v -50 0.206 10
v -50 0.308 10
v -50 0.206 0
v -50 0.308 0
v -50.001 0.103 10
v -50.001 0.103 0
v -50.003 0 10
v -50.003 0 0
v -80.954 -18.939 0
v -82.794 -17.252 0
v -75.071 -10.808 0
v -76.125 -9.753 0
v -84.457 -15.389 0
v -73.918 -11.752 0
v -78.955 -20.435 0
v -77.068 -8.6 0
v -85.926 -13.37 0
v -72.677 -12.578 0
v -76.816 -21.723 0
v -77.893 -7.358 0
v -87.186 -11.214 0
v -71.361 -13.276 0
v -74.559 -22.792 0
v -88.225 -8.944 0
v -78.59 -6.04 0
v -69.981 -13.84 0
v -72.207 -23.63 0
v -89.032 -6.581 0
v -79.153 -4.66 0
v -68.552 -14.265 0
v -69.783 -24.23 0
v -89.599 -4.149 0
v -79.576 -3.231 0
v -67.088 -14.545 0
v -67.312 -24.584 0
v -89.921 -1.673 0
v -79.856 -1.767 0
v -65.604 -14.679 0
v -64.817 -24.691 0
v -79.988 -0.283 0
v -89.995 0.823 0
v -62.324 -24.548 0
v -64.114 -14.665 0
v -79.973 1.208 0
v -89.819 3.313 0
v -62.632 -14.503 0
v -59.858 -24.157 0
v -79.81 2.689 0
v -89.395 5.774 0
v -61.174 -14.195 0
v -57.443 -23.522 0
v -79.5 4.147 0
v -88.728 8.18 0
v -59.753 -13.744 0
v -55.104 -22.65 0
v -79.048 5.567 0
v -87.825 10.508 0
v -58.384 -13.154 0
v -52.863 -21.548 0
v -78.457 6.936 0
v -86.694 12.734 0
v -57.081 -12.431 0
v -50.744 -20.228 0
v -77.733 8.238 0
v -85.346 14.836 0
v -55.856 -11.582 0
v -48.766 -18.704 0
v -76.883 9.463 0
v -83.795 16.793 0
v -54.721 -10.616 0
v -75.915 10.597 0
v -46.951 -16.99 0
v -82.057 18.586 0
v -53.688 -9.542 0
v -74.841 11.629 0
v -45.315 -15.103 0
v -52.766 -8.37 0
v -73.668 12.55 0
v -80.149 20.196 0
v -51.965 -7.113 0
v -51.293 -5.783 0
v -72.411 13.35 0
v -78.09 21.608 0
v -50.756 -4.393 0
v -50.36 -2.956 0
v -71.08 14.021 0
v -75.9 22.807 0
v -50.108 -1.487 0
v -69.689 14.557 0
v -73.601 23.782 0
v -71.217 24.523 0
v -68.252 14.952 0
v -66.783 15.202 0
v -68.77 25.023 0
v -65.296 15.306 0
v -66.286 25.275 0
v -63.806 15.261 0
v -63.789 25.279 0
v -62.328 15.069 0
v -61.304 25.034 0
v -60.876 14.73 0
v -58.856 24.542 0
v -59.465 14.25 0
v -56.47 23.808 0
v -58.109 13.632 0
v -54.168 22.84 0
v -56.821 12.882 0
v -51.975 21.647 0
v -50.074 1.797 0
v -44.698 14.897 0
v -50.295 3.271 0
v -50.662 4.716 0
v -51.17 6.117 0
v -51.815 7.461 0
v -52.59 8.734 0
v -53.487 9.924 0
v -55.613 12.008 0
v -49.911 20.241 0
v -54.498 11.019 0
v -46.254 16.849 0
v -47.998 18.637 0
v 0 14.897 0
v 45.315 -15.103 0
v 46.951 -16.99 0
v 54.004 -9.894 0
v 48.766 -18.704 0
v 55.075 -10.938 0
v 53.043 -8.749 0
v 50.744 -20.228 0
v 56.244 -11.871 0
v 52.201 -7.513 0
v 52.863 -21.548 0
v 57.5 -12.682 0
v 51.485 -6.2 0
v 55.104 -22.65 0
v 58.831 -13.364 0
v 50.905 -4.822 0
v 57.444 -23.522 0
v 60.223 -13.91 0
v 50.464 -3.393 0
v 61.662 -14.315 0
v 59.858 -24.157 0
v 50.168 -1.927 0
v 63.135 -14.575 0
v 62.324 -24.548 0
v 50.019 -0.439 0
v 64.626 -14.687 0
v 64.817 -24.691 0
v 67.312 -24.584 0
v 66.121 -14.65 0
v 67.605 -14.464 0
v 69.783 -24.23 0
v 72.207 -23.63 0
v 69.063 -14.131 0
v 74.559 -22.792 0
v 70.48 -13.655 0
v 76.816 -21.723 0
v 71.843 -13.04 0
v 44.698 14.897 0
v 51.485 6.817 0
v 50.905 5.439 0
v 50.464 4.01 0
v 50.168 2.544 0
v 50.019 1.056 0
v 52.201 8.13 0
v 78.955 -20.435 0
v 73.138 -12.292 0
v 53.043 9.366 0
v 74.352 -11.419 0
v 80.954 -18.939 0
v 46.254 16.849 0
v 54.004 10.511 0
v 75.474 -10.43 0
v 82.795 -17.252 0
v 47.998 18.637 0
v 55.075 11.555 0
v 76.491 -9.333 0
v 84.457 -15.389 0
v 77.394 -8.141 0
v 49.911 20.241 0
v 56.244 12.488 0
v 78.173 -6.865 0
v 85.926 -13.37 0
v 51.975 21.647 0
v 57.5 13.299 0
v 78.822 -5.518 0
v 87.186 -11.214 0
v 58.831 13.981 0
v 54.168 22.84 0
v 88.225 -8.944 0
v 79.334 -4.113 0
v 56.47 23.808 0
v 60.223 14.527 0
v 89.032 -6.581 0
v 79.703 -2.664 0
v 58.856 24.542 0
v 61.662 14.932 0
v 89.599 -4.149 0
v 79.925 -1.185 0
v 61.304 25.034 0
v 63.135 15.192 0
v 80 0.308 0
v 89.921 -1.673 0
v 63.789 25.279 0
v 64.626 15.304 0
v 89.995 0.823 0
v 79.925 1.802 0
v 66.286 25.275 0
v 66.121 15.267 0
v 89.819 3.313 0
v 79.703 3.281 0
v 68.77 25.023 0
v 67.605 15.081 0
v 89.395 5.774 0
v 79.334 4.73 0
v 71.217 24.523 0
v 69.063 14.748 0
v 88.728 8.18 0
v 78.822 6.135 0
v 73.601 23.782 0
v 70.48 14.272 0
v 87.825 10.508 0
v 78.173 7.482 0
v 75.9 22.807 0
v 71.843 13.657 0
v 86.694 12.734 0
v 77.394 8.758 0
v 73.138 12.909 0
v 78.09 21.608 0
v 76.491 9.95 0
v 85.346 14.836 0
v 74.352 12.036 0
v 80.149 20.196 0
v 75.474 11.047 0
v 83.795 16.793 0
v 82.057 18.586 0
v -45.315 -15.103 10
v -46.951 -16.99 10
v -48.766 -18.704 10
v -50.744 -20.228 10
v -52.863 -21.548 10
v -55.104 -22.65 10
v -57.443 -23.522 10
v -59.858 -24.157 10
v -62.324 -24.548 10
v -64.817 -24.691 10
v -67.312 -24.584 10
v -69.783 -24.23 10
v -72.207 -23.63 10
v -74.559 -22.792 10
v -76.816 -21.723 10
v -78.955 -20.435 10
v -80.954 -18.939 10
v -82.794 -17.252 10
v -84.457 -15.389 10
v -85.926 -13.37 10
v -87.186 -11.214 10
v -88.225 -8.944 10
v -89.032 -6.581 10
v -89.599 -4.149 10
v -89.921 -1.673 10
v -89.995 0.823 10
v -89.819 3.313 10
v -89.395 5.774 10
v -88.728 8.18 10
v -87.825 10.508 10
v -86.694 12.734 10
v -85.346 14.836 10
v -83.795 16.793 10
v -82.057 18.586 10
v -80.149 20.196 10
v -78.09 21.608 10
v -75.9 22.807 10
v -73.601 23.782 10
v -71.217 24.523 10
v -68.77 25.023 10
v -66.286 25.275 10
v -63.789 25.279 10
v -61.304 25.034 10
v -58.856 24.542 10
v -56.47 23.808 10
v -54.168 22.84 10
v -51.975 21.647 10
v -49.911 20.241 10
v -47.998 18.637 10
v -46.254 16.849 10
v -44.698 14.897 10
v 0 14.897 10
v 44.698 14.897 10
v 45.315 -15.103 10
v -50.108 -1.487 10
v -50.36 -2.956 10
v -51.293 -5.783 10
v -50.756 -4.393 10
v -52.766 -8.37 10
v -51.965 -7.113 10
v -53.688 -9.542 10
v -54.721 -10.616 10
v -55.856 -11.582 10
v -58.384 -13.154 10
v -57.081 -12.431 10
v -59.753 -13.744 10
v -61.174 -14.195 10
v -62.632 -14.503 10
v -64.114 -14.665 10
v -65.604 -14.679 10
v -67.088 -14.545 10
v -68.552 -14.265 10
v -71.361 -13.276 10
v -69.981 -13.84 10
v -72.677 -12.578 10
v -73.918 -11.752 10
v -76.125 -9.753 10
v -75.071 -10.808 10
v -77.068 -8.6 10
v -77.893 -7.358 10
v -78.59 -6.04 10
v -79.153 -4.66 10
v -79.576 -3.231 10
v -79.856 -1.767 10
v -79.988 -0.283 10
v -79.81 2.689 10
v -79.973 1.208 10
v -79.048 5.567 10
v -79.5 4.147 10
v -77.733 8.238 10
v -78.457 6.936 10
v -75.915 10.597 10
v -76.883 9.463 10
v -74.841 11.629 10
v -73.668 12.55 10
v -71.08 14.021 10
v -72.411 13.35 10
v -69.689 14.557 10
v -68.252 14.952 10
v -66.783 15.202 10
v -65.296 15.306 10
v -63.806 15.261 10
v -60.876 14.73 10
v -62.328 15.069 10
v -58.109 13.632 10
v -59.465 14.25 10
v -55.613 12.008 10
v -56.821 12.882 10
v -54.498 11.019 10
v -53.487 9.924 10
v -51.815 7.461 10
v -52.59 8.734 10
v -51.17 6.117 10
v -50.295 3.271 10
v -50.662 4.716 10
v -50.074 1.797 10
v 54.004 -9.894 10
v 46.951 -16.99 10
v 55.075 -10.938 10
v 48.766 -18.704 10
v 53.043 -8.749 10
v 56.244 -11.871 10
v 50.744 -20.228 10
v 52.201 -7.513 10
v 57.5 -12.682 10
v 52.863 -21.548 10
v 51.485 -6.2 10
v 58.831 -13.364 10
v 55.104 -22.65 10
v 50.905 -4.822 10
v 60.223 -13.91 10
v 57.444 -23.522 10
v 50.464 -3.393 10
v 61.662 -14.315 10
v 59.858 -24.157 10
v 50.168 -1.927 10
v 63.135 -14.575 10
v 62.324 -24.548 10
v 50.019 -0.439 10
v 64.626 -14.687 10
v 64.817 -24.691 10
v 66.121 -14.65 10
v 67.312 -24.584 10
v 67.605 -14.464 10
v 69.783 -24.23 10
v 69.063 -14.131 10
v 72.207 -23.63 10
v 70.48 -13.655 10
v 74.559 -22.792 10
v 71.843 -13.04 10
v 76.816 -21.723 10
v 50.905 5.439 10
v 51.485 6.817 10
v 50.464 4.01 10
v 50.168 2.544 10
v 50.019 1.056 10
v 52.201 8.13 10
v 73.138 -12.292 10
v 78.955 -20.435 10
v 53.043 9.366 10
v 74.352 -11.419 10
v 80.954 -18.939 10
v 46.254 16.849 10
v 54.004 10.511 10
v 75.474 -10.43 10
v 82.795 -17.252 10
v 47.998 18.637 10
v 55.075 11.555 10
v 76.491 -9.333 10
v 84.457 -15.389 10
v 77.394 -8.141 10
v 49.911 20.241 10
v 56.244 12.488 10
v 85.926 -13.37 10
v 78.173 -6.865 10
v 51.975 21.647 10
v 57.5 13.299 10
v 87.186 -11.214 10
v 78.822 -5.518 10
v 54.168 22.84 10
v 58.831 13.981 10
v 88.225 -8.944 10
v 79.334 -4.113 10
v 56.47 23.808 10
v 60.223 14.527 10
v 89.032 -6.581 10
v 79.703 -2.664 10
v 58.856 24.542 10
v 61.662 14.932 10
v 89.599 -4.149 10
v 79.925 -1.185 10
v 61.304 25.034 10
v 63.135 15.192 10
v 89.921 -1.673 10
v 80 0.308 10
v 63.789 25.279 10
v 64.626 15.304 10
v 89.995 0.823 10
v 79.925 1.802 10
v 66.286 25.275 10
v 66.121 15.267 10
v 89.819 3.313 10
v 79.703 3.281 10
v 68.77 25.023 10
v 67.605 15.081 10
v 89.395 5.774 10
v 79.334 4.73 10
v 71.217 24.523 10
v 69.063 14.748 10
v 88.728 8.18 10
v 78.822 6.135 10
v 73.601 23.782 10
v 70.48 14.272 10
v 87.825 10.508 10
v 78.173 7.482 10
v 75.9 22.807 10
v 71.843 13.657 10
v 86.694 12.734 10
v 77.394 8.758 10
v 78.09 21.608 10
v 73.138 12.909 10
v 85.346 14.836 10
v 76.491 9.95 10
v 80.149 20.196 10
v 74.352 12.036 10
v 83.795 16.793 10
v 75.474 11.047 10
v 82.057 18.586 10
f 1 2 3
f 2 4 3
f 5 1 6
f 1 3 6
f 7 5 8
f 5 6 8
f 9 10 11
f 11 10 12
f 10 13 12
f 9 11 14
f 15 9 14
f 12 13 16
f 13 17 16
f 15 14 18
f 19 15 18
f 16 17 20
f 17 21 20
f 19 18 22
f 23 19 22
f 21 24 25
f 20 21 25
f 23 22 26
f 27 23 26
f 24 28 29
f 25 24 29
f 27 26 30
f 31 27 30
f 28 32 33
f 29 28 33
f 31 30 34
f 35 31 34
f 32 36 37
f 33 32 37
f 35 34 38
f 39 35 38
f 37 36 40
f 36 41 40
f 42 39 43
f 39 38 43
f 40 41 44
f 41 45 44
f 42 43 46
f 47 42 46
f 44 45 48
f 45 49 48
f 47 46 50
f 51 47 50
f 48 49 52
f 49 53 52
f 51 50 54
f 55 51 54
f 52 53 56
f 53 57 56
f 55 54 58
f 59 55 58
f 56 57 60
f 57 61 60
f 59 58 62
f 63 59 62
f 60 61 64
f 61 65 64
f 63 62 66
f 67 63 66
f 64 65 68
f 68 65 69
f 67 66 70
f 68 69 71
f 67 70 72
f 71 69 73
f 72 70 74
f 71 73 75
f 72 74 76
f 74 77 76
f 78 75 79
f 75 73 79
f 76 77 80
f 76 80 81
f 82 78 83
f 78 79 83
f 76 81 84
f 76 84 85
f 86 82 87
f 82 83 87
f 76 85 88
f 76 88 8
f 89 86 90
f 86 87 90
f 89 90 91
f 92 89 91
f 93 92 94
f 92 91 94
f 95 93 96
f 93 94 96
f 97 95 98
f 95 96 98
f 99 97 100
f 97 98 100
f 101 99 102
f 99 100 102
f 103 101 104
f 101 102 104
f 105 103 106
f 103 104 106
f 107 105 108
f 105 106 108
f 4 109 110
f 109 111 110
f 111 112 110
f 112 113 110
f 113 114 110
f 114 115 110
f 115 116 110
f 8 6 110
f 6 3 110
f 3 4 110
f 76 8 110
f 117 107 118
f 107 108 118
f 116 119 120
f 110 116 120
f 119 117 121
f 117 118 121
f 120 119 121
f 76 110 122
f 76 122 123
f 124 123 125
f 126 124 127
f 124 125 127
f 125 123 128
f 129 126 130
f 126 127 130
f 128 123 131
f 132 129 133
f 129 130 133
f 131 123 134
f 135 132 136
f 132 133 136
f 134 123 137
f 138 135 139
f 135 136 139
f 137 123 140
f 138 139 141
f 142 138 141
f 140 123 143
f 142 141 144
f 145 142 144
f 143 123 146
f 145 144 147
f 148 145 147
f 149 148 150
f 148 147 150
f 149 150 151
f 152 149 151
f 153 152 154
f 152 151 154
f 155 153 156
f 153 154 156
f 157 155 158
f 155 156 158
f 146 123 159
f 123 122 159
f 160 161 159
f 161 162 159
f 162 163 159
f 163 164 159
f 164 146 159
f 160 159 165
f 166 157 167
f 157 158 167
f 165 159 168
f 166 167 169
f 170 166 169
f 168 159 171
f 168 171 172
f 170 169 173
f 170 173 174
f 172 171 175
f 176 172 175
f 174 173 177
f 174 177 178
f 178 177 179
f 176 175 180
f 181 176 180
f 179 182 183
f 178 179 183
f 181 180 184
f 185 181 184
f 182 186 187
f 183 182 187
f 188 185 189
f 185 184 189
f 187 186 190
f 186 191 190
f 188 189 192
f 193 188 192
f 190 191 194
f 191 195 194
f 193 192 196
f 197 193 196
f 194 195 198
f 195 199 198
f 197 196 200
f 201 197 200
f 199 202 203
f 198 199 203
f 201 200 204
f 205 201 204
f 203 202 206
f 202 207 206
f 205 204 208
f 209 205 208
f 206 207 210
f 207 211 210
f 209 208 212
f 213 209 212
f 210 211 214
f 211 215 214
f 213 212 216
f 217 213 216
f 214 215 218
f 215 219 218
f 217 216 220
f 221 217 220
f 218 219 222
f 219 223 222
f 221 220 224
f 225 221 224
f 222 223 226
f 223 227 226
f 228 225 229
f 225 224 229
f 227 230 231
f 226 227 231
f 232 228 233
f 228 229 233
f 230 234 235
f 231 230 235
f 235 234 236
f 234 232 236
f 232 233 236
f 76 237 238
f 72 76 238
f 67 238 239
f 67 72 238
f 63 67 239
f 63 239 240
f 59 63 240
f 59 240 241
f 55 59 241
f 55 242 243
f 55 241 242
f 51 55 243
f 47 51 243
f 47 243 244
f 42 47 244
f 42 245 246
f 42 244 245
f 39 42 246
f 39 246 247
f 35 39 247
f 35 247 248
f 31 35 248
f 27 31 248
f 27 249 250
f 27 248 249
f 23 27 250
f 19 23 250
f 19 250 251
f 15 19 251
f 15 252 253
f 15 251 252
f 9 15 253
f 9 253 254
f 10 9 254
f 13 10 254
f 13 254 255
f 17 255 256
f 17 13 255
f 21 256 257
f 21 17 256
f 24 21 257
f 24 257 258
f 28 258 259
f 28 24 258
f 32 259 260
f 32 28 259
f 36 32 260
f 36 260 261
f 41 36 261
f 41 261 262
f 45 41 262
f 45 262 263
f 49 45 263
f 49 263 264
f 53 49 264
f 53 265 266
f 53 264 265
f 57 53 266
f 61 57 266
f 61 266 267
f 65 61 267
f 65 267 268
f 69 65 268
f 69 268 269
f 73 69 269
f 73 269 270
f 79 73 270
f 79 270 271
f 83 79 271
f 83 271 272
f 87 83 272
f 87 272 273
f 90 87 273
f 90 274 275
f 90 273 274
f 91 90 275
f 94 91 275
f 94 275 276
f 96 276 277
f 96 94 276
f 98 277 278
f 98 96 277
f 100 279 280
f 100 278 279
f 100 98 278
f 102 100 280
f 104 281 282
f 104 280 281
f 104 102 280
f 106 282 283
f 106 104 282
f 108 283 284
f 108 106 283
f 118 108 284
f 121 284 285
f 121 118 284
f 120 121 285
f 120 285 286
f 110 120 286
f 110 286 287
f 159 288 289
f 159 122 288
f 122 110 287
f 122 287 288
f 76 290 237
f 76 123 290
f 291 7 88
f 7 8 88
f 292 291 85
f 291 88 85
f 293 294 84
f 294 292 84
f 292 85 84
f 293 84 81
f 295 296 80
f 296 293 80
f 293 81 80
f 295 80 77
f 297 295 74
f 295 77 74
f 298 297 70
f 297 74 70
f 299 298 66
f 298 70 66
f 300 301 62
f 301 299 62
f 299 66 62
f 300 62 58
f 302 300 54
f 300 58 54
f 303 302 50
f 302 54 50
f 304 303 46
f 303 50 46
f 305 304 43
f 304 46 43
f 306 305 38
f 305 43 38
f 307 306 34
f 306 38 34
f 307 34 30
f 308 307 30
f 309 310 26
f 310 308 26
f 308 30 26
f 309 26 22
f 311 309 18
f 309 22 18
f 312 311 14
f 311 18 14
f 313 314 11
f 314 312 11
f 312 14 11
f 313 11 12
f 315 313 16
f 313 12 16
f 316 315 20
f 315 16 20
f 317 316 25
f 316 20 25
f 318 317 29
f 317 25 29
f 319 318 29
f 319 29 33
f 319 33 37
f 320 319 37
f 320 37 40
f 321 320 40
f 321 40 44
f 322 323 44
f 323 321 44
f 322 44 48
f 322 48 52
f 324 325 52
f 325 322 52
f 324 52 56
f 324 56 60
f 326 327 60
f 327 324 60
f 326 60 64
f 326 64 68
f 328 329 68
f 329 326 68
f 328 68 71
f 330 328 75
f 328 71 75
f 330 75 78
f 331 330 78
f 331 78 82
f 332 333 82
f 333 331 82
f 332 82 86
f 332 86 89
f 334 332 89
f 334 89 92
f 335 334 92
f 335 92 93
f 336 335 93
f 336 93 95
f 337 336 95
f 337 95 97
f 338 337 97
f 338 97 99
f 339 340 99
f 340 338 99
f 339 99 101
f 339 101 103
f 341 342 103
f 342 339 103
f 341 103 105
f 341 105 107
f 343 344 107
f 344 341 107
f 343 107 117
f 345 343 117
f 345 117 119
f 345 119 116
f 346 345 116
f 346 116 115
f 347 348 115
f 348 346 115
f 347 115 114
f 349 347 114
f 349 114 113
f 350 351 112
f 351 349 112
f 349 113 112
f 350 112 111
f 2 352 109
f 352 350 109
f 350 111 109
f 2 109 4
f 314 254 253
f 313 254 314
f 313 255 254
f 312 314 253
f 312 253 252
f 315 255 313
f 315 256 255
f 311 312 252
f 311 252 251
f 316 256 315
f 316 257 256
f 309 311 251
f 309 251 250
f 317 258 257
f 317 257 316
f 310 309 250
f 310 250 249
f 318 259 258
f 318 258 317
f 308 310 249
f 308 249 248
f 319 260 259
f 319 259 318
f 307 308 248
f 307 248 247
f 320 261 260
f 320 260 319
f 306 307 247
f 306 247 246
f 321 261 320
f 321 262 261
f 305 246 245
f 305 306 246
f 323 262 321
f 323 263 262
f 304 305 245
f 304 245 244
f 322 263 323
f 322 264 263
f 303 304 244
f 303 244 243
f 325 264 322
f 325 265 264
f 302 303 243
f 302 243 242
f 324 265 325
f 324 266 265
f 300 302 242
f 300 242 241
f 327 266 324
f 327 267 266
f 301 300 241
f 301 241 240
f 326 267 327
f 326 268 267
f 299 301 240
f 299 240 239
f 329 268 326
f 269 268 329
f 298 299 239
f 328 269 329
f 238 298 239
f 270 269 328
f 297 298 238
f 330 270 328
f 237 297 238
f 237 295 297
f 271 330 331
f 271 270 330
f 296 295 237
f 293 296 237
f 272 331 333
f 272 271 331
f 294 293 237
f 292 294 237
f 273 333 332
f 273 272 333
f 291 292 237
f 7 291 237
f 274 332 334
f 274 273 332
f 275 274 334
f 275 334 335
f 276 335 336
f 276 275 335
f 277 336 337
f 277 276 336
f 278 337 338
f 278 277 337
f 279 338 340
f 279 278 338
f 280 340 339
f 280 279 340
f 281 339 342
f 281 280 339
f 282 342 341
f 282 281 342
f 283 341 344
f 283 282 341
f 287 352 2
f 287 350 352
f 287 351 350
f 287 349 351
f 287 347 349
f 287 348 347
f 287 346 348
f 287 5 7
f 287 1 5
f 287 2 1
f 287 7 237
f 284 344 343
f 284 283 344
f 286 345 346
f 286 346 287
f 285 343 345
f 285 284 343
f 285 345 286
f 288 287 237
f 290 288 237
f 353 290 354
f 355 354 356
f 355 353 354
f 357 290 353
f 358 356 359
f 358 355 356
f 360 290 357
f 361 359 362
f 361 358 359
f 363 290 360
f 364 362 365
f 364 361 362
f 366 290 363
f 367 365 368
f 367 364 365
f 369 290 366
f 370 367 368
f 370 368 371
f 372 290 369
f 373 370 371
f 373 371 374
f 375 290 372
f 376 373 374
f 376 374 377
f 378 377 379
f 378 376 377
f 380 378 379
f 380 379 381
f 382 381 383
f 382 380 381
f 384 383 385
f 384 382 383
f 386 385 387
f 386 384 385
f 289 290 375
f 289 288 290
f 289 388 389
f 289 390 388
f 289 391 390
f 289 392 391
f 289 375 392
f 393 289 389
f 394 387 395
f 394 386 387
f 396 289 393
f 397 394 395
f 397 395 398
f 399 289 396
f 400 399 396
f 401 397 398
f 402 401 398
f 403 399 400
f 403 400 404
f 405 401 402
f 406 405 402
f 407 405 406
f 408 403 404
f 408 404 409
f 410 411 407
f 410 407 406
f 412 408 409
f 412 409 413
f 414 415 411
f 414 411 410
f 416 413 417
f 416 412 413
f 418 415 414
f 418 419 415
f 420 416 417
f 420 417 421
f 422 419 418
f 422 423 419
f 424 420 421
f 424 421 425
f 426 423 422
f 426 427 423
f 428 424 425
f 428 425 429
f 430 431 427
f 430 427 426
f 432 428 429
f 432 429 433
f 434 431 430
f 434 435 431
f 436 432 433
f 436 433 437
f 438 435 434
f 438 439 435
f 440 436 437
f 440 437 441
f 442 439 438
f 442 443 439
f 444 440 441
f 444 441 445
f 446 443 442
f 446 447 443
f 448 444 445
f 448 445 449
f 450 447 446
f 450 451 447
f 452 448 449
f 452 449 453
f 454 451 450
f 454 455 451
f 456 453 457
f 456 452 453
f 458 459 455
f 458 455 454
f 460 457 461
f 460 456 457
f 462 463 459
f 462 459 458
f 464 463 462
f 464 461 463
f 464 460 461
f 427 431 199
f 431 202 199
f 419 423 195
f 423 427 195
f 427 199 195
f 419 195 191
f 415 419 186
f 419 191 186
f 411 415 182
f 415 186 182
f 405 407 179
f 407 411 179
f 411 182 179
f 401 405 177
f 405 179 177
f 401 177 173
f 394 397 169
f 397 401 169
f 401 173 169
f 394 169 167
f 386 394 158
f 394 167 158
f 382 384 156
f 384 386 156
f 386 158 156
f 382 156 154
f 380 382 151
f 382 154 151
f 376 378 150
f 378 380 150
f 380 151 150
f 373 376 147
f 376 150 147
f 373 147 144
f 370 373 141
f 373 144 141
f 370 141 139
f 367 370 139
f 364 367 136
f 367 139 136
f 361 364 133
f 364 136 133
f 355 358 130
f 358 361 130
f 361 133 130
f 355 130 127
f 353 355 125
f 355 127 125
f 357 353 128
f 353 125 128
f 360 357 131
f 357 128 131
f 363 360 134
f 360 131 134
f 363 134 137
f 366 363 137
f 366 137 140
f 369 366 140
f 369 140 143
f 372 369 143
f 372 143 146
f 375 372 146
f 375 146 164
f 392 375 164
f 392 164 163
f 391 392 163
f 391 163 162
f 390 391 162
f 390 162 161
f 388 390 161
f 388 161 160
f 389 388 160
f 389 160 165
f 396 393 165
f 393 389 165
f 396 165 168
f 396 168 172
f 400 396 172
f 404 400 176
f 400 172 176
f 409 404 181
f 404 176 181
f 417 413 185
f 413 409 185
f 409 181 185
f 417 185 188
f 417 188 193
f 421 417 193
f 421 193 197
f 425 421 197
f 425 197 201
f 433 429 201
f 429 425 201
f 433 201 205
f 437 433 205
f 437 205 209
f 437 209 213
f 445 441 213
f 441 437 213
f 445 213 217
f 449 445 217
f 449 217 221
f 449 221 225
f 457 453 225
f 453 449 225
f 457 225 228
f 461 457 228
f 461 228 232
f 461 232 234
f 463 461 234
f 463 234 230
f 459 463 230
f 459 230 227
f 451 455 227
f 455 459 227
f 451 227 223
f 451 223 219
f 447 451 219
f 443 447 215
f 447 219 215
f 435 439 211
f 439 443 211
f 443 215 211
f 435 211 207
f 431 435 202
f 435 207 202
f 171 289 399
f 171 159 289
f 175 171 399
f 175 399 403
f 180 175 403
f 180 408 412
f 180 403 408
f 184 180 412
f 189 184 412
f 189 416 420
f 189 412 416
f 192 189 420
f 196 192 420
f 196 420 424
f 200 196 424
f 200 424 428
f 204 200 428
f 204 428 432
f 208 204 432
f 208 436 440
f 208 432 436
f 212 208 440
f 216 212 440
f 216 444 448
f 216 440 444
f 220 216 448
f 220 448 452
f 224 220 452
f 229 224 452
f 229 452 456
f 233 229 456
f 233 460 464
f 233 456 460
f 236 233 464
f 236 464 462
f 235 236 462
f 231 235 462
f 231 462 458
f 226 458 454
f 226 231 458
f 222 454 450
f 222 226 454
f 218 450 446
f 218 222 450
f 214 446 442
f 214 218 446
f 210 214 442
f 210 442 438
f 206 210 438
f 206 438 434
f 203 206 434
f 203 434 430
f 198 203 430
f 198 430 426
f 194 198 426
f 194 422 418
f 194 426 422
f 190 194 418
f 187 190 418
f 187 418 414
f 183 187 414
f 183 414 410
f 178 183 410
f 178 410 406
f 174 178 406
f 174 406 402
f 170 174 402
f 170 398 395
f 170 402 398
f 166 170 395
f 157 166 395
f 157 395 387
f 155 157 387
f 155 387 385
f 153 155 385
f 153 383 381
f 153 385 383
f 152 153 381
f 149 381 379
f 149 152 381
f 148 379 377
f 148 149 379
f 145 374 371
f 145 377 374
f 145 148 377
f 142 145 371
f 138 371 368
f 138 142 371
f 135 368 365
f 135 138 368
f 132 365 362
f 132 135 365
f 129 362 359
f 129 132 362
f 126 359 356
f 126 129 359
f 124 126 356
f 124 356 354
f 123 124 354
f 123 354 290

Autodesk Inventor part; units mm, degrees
ref_plane "YZ Plane" through (0, 0, 0) normal (1, 0, 0) x (0, 1, 0)
ref_plane "XZ Plane" through (0, 0, 0) normal (0, 1, 0) x (-1, 0, 0)
ref_plane "XY Plane" through (0, 0, 0) normal (0, 0, 1) x (1, 0, 0)
sketch "草图1" plane through (0, 0, 0) normal (0, 0, 1) x (1, 0, 0)
  circle A0 centre (-65, 0.3085) radius 15
  circle A1 centre (65, 0.3085) radius 15
  arc A2 (-44.698, 14.8971) -> (-45.3152, -15.1029) centre (-65, 0.3085) ccw
  arc A3 (45.3152, -15.1029) -> (44.698, 14.8971) centre (65, 0.3085) ccw
  line L0 (0, 0) -> (0, 60.3628)
  line L1 (0, 0) -> (-51.6716, 0)
  line L2 (-44.698, 14.8971) -> (44.698, 14.8971)
  line L3 (45.3152, -15.1029) -> (-45.3152, -15.1029)
  line L4 (-44.698, 14.8971) -> (45.3152, -15.1029) construction
  line L5 (44.698, 14.8971) -> (-45.3152, -15.1029) construction
  dimension "d0" = 30
  dimension "d1" = 30
  dimension "d2" = 50
  dimension "d3" = 50
  dimension "d4" = 65
  dimension "d6" = 65
  dimension "d9" = 30
extrude "拉伸1" add sketch "草图1" along normal blind 10
properties part number "ConnectBar" material "钢，高强度，低合金"
